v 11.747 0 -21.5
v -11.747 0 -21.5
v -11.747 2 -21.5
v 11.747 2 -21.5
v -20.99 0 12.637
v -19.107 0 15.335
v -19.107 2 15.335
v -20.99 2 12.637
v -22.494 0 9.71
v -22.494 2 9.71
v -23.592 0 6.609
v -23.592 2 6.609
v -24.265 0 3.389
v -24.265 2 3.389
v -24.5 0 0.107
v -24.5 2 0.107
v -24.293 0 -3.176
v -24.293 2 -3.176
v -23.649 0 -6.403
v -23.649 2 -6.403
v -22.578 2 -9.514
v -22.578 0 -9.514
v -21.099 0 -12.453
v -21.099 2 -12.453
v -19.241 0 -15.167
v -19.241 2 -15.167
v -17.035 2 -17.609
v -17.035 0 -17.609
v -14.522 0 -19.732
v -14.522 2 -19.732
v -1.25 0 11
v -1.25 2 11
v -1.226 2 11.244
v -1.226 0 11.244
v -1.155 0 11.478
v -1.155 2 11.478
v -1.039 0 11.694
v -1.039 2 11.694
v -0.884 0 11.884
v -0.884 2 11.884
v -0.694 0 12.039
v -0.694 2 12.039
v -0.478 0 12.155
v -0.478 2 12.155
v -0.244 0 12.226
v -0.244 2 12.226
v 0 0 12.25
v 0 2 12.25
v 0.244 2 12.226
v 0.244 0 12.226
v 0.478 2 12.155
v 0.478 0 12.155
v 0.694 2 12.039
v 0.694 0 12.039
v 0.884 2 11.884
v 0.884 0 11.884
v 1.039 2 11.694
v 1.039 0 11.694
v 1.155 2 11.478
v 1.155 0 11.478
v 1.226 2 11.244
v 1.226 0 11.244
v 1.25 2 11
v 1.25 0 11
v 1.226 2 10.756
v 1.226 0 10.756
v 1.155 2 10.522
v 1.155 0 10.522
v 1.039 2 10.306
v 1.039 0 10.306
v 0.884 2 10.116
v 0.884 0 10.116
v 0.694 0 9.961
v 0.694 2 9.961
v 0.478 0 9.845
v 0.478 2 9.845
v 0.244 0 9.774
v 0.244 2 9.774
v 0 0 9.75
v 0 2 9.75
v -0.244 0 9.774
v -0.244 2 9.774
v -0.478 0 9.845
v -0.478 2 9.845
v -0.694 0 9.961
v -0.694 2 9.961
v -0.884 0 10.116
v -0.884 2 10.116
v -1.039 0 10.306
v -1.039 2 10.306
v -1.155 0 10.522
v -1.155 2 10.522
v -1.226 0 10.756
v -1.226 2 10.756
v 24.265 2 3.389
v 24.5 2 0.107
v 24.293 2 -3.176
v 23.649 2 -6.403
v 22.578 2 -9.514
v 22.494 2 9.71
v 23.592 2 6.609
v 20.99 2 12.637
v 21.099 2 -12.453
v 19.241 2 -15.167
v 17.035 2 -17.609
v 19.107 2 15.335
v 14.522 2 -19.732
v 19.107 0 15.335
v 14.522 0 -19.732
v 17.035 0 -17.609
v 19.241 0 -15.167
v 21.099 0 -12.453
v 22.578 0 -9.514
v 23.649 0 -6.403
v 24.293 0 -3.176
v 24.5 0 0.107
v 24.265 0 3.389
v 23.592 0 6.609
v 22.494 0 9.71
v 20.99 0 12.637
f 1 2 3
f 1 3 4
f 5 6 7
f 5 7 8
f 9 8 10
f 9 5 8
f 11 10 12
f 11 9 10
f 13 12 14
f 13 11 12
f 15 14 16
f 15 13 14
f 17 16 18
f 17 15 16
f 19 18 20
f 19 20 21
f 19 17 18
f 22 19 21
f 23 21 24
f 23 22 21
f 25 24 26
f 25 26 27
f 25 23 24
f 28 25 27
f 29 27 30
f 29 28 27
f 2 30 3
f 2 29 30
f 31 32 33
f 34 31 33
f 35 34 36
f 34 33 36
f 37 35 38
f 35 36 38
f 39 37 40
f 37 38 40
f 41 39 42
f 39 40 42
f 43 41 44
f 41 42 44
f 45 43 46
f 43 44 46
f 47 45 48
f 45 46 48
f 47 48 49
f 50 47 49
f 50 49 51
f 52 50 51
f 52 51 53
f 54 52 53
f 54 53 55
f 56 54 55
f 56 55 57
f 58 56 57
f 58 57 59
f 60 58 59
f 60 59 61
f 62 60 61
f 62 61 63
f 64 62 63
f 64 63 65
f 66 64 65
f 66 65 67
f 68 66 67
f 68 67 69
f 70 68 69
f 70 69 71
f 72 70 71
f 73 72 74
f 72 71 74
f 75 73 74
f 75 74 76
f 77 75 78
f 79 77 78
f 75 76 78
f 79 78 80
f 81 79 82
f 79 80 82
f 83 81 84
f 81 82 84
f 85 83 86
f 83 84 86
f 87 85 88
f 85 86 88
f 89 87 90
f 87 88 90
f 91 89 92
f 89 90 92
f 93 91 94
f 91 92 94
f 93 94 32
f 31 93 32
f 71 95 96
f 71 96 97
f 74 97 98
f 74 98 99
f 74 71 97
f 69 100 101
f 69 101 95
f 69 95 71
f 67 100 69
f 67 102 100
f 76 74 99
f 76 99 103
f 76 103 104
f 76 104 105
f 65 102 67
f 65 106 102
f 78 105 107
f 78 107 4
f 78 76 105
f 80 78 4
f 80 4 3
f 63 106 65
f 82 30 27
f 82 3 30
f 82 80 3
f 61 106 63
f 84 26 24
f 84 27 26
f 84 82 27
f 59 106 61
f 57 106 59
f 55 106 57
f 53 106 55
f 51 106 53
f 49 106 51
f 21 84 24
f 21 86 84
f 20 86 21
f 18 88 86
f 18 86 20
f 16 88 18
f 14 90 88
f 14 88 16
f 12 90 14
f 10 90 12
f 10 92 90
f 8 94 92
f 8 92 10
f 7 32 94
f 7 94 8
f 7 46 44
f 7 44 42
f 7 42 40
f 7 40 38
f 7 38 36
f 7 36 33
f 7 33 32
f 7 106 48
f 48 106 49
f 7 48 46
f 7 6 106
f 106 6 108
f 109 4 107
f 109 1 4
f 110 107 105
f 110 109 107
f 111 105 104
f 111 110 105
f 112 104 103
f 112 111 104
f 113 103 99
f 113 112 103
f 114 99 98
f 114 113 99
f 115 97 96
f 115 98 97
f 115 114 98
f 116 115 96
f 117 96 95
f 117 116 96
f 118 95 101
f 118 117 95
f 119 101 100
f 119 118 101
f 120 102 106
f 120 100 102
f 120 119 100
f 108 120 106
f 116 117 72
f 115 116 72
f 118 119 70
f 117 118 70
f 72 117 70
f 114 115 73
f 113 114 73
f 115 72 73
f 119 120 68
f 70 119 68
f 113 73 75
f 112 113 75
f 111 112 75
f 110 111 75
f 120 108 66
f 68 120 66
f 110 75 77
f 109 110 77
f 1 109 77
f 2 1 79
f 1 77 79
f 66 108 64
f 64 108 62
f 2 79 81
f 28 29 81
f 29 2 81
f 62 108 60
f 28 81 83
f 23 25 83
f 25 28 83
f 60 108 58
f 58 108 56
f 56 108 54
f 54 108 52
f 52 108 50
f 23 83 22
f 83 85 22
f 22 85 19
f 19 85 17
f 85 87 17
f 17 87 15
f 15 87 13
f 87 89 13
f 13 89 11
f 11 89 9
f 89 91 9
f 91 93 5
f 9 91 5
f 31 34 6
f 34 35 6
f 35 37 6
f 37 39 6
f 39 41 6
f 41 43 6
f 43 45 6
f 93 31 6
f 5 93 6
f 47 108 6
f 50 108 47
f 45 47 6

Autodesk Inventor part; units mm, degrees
ref_plane "YZ Plane" through (0, 0, 0) normal (1, 0, 0) x (0, 1, 0)
ref_plane "XZ Plane" through (0, 0, 0) normal (0, 1, 0) x (-1, 0, 0)
ref_plane "XY Plane" through (0, 0, 0) normal (0, 0, 1) x (1, 0, 0)
sketch "スケッチ1" plane through (0, 0, 0) normal (0, 1, 0) x (-1, 0, 0)
  point P0 (0, 0)
sketch "スケッチ2" plane through (0, 0, 0) normal (0, 1, 0) x (-1, 0, 0)
  arc A0 (-19.1073, 15.335) -> (-11.7473, -21.5) centre (0, 0) ccw
  line L0 (0, 0) -> (0, -21.5)
  line L1 (0, 0) -> (0, 15.335)
  line L2 (0, -21.5) -> (-11.7473, -21.5)
  line L3 (0, 15.335) -> (-19.1073, 15.335)
  dimension "d1" = 21.5
  dimension "d3" = 15.335
  dimension "d4" = 24.5
extrude "押し出し1" add sketch "スケッチ2" along normal blind 2
sketch "スケッチ3" plane through (0, 2, 0) normal (0, 1, 0) x (1, 0, 0)
  line L0 (0, 21.5) -> (0, -15.335) projected
  circle A0 centre (0, -11) radius 1.25
  point P0 (0, 0)
  point P1 (0, -9.75)
  point P2 (0, -12.25)
  dimension "d7" = 2.5
  dimension "d8" = 11
extrude "押し出し2" cut sketch "スケッチ3" against normal blind 10 contours A0 L0 picked at (0.1808, -10.6246)
mirror "ミラー2" about plane through (0, 0, -21.5) normal (-1, 0, 0) of "押し出し2", "押し出し1"
properties part number "huta"
